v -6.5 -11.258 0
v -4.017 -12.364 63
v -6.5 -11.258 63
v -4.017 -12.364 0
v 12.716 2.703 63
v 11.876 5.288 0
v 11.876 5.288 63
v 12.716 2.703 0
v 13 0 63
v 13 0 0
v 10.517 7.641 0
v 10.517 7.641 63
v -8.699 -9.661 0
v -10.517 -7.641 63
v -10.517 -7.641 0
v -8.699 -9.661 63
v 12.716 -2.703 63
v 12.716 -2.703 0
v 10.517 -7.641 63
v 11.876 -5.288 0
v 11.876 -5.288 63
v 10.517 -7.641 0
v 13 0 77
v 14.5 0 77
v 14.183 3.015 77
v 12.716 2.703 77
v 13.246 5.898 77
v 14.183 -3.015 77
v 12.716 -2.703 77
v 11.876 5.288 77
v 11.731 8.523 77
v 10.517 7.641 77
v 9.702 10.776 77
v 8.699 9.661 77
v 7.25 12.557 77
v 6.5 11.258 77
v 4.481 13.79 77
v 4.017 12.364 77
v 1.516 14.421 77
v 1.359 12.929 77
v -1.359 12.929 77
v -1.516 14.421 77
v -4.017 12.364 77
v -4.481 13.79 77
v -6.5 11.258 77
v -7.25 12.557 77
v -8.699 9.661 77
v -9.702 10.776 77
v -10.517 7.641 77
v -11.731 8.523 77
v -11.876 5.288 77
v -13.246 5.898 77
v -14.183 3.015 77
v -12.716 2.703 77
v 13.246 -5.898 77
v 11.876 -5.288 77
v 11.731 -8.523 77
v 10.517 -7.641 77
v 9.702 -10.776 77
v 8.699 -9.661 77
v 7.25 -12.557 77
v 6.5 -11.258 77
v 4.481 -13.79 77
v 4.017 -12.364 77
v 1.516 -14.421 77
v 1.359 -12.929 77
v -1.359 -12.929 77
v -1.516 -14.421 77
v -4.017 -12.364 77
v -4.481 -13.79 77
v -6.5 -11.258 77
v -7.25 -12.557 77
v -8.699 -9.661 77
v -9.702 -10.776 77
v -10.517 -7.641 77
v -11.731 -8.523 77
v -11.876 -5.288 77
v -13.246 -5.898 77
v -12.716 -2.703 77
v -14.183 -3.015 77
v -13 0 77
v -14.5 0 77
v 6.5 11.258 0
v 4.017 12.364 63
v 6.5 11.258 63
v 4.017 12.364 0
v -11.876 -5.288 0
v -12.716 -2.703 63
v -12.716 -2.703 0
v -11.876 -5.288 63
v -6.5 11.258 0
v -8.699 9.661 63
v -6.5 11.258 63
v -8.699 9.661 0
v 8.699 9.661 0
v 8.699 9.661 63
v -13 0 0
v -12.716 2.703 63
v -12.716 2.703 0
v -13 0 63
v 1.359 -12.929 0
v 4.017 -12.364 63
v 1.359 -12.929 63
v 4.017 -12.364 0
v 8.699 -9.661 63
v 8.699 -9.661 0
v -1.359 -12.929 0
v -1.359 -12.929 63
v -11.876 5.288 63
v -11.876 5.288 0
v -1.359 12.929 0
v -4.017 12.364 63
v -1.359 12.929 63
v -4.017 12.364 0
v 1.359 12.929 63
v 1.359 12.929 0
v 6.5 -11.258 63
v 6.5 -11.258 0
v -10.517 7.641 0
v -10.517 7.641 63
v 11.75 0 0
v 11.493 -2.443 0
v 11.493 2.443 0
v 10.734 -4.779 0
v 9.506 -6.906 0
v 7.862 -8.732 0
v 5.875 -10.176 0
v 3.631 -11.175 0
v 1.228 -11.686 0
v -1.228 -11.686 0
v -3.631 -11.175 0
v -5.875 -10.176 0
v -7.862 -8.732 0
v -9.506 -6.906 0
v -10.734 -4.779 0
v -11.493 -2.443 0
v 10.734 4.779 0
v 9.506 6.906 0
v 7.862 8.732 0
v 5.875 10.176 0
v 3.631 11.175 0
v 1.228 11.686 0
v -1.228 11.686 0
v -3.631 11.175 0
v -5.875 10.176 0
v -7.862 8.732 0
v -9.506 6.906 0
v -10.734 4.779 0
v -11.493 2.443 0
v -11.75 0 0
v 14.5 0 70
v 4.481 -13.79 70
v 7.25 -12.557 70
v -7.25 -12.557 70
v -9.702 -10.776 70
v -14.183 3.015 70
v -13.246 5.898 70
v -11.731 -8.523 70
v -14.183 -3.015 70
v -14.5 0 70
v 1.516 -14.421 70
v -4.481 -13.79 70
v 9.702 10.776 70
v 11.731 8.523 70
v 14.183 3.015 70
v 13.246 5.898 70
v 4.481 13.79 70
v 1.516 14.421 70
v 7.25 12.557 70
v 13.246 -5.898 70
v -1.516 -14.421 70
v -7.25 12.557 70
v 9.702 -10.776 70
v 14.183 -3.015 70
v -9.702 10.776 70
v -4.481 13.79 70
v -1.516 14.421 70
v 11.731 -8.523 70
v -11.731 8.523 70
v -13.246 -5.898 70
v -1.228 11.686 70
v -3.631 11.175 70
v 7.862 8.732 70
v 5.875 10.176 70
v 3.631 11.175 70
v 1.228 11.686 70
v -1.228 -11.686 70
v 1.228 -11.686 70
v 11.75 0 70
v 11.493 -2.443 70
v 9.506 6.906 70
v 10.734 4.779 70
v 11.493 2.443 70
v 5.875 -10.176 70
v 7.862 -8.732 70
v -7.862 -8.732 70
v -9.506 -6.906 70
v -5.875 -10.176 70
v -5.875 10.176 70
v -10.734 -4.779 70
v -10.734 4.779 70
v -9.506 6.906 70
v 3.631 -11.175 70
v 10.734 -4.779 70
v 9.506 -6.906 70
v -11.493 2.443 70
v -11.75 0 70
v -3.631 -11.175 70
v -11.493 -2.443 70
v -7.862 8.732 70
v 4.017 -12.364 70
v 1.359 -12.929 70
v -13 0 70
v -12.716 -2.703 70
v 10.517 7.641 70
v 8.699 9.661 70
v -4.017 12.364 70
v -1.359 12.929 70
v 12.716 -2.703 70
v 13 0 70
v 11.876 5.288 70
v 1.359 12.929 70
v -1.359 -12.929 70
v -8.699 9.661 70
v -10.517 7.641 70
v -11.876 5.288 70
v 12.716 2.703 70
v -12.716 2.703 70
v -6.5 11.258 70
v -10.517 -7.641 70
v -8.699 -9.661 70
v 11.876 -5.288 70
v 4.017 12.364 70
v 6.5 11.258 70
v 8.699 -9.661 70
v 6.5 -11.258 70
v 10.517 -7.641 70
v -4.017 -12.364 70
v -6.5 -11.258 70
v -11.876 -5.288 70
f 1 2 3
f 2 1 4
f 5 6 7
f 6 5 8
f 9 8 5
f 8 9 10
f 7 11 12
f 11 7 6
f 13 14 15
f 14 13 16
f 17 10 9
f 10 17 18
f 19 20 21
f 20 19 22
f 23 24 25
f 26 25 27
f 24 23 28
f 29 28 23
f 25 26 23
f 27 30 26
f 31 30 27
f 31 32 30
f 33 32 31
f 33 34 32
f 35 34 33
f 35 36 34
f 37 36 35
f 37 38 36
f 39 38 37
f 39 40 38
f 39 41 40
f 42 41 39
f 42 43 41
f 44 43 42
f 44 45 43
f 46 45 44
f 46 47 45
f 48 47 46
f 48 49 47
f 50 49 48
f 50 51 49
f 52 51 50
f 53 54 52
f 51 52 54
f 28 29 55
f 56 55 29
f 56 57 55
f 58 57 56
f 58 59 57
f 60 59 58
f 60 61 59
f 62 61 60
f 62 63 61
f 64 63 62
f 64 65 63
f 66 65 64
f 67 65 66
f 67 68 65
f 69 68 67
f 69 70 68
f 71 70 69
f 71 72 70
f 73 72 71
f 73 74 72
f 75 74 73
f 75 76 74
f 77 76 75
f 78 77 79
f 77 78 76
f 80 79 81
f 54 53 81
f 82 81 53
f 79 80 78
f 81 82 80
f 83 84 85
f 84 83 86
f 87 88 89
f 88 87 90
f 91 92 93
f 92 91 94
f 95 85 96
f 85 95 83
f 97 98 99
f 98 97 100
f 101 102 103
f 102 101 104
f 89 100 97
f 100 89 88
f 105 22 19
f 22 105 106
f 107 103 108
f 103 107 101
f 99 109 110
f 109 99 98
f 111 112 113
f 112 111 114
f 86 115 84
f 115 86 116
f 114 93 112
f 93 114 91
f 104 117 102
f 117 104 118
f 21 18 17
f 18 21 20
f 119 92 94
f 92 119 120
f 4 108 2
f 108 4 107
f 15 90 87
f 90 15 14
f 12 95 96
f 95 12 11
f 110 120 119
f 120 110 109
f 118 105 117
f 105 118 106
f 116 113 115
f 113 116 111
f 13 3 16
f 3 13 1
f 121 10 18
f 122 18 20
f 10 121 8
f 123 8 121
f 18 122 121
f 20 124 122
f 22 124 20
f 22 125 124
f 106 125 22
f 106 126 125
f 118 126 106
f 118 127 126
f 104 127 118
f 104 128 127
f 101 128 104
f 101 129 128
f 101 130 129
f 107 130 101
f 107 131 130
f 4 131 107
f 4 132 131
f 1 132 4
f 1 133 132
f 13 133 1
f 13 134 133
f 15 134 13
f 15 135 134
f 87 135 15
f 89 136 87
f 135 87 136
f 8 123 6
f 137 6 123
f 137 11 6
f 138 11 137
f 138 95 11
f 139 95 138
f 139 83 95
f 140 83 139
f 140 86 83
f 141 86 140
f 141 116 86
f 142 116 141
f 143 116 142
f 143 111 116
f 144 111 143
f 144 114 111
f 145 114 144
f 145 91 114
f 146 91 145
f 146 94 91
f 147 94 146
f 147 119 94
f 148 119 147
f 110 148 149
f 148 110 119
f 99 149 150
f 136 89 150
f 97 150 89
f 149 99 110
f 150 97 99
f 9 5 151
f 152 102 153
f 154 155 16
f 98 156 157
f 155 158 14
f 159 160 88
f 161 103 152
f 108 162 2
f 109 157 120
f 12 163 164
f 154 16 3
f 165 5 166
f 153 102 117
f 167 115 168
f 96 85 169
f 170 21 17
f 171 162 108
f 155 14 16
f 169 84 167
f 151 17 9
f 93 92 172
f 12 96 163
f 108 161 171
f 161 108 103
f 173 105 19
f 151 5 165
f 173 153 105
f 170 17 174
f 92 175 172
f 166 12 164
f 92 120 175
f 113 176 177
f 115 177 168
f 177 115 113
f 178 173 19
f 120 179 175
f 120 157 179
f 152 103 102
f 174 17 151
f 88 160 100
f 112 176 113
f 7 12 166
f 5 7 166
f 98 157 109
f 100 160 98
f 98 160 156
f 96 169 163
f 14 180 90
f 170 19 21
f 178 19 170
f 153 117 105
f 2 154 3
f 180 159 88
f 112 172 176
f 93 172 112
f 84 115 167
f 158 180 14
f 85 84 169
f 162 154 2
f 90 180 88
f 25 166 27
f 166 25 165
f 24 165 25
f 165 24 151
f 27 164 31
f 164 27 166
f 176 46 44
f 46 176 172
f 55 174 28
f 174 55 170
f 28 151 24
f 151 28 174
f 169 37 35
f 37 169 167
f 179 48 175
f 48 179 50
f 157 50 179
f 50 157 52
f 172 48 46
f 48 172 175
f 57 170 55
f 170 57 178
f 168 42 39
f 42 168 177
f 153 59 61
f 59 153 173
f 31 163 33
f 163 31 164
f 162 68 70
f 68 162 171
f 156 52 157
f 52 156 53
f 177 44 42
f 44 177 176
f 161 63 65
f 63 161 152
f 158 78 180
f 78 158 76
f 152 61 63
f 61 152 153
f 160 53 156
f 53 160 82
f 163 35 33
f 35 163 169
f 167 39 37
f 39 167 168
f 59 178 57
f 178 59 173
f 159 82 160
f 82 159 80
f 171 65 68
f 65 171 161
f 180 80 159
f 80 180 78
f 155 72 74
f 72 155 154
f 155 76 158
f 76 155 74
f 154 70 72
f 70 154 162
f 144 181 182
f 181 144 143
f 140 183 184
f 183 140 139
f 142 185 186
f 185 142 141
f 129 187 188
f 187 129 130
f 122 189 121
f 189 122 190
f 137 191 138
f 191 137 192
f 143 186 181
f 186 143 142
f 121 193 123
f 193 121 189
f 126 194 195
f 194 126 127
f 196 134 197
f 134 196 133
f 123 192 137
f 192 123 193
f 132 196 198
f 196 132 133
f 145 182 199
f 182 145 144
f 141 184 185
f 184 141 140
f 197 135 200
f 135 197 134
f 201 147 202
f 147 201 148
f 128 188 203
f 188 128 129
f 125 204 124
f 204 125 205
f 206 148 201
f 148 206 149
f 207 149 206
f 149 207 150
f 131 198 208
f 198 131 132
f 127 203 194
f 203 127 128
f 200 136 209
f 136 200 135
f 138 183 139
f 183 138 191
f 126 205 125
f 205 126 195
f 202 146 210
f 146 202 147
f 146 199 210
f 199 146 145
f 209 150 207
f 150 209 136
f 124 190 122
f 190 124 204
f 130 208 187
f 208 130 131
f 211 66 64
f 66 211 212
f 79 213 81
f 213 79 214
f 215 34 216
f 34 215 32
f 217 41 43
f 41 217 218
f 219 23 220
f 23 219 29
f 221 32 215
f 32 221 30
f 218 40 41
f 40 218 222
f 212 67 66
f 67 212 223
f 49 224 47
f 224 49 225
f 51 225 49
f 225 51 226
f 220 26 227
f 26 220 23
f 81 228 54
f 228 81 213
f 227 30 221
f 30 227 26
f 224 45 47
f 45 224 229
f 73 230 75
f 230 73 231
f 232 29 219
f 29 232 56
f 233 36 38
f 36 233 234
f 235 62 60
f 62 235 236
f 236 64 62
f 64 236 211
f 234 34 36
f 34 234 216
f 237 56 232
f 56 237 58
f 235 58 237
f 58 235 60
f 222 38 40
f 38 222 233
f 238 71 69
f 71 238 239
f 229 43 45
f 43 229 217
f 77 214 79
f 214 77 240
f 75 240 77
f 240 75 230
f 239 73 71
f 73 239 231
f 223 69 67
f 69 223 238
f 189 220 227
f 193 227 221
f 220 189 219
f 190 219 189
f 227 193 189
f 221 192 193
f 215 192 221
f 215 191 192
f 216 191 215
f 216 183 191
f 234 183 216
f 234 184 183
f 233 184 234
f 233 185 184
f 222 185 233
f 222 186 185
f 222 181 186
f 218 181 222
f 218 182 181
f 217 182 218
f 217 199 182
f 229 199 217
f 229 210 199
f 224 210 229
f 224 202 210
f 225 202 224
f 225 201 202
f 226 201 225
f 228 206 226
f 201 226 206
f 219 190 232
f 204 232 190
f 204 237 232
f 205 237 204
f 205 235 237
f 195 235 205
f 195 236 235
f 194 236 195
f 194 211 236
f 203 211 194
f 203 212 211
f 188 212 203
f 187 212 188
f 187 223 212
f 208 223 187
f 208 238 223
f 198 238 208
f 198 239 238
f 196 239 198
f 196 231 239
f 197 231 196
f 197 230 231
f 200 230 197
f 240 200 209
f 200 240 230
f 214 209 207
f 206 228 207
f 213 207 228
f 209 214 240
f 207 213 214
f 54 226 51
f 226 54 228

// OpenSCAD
bearing_dia = 22;
margin = 1.5;
wall_thickness = 2.5;
bearing_height=7;
count = 11;

bearing_tube();
module bearing_tube(){

	difference(){
		union(){		
			cylinder(r=(bearing_dia+margin+wall_thickness)/2,h=count*bearing_height);
			translate(v=[0,0,bearing_height*(count-2)]) cylinder(r1=(bearing_dia+margin+wall_thickness)/2, r2=(bearing_dia+margin+wall_thickness*2+0.5)/2, h=bearing_height*1);
			translate(v=[0,0,bearing_height*(count-1)]) cylinder(r=(bearing_dia+margin+wall_thickness*2+0.5)/2, h=bearing_height*1);
		}

		cylinder(r=(bearing_dia+margin)/2,h=count*bearing_height);
		translate(v=[0,0,bearing_height*(count-1)]) cylinder(r=(bearing_dia+margin+wall_thickness)/2, h=bearing_height*1);

	}
}
